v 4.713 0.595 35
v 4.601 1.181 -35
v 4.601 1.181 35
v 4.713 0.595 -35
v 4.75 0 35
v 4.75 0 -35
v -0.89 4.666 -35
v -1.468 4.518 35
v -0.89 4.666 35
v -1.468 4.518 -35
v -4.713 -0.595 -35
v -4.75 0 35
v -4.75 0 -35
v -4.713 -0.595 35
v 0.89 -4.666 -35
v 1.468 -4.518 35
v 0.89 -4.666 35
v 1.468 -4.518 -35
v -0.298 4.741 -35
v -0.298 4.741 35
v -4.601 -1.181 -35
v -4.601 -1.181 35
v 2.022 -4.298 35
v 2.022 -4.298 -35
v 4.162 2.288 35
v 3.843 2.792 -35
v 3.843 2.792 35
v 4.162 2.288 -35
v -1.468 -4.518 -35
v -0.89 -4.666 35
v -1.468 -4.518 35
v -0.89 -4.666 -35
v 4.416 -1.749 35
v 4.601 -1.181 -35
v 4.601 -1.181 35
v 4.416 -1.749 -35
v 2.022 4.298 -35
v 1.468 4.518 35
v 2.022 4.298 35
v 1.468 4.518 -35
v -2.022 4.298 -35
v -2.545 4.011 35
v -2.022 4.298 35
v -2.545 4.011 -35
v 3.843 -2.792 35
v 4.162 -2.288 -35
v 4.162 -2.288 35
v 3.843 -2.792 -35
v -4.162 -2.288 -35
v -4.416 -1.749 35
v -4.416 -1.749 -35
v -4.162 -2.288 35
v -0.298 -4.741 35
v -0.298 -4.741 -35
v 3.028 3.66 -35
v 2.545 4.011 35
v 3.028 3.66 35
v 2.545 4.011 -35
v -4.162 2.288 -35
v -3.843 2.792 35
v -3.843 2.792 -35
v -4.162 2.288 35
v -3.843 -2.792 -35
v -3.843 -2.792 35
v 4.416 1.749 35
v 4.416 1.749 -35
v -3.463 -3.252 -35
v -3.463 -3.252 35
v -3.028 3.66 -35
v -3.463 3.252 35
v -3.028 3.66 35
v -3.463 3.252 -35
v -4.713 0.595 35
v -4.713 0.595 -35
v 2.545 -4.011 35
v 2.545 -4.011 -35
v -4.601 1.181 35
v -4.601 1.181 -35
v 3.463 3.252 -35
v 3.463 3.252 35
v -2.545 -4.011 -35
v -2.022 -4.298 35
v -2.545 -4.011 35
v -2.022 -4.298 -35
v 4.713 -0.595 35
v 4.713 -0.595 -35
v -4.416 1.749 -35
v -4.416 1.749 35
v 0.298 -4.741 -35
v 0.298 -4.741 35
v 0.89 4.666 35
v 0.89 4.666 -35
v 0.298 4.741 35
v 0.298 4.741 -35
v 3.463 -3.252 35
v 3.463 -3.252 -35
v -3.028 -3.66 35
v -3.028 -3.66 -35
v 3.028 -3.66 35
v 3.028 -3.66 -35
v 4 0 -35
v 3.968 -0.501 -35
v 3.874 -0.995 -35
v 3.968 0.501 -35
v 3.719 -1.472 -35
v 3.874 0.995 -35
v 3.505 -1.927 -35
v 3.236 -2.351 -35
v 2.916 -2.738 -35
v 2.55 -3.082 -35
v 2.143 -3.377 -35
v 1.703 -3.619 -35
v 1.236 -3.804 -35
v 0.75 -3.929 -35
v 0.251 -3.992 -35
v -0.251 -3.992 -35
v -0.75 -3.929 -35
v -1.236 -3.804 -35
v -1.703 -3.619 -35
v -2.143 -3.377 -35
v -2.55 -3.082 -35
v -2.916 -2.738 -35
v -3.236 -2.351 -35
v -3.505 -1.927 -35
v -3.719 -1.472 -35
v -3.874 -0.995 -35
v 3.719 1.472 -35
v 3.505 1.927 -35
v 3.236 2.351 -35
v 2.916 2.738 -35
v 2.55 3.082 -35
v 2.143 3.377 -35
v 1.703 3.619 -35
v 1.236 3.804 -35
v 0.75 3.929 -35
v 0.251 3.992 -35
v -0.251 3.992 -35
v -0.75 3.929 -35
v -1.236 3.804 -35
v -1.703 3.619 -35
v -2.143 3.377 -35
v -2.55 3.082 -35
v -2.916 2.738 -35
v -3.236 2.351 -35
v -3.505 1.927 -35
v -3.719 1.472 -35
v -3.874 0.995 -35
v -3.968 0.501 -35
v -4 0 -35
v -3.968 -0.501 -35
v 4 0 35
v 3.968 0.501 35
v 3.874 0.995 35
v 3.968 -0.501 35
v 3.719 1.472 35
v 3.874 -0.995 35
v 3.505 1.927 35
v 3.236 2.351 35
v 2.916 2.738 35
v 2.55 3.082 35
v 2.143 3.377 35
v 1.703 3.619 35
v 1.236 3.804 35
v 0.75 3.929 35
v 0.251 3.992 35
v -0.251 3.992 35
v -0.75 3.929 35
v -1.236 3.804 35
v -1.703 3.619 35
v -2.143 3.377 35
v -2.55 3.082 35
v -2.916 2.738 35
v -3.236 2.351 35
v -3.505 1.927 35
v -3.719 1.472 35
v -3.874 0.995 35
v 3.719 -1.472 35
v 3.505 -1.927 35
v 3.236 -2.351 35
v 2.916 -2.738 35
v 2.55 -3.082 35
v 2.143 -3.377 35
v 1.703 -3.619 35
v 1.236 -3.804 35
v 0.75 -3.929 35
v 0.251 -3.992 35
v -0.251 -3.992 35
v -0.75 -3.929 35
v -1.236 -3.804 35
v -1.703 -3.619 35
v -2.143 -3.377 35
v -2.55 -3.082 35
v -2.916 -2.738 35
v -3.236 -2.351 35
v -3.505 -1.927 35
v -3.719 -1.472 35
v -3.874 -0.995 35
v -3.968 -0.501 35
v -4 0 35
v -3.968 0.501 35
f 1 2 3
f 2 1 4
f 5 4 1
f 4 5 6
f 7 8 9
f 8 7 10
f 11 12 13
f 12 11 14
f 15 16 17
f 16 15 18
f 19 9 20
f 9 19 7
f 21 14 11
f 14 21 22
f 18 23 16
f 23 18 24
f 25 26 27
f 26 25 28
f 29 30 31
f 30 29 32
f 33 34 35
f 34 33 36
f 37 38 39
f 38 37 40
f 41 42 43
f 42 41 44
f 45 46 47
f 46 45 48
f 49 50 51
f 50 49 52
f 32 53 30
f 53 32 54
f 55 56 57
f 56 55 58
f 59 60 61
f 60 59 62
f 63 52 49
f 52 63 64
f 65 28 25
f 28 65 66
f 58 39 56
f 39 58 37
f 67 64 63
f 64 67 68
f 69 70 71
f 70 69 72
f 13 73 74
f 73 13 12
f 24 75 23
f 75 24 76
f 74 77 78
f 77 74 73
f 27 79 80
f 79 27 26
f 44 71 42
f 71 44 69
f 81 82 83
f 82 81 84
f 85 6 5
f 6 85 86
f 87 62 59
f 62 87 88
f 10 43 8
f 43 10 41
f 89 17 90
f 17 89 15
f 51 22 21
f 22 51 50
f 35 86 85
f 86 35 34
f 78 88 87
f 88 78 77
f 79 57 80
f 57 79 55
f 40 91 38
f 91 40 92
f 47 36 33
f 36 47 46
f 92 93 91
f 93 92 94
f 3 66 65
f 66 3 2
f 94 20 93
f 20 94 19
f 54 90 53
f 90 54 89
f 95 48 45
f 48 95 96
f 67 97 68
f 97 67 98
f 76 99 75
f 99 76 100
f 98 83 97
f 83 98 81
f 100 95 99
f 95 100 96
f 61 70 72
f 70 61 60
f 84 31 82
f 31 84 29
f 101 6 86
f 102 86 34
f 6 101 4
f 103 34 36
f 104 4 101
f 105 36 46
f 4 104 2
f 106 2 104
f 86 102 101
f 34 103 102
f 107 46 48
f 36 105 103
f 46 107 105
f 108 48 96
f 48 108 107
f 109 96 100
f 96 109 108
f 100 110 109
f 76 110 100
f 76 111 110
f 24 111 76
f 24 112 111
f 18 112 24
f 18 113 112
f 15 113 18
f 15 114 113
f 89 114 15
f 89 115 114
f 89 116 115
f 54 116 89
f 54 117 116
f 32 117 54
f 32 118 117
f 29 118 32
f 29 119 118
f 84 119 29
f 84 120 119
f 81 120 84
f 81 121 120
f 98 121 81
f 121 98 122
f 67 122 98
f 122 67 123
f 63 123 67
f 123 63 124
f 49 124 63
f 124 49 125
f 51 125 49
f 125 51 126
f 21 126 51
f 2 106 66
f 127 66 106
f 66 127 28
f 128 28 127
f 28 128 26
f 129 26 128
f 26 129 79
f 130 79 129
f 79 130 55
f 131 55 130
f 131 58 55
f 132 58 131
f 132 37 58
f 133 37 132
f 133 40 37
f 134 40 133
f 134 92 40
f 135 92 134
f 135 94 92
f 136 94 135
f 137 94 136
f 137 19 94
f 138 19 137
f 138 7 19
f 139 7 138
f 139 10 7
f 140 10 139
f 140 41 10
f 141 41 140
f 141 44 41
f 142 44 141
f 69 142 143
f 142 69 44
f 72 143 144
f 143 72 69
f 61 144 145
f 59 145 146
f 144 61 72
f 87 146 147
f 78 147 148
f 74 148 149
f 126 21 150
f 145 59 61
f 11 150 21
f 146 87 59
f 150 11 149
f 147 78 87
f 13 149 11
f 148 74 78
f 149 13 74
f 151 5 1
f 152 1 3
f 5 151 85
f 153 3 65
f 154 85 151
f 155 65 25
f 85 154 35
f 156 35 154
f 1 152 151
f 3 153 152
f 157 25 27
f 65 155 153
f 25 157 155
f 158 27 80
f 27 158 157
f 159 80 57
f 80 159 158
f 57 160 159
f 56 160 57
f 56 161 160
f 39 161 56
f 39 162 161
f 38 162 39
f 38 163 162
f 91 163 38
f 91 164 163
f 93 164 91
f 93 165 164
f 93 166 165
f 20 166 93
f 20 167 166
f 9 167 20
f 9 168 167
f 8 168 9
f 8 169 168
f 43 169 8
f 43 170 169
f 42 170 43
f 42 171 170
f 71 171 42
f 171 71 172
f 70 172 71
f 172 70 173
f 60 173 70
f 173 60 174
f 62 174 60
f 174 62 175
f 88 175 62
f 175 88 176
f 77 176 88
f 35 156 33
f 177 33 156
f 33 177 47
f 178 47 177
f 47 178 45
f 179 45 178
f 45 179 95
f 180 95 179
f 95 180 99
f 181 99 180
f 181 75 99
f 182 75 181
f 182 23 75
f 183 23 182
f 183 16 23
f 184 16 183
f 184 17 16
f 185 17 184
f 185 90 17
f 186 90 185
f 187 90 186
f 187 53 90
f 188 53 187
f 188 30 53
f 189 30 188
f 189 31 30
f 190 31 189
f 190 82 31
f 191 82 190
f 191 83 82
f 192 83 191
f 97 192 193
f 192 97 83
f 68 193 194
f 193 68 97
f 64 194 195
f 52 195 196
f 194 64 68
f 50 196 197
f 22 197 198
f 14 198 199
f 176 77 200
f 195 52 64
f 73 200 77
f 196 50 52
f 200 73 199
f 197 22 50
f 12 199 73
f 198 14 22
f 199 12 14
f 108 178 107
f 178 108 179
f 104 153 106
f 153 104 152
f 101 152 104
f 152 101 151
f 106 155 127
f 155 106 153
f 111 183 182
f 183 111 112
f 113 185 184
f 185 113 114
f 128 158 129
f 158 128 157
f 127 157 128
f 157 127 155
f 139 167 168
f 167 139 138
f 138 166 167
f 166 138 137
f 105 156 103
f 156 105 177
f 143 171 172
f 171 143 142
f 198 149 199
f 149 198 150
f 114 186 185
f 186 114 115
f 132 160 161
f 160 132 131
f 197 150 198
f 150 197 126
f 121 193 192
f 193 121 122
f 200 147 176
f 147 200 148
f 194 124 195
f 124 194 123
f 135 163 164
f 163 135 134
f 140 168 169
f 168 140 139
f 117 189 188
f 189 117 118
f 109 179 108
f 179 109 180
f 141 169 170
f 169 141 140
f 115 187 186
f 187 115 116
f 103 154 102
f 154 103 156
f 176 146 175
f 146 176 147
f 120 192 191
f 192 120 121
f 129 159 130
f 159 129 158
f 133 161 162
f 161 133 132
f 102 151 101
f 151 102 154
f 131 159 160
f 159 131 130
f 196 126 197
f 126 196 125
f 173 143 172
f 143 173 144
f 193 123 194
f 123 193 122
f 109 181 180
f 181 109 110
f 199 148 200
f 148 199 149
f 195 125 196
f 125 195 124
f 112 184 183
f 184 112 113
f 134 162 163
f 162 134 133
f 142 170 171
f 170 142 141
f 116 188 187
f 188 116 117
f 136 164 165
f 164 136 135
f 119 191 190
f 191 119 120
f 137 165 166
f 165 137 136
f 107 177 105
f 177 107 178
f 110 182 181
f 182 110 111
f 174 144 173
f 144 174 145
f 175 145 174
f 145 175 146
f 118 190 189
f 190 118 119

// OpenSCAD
$fn = 50;


difference() {
	union() {
		translate(v = [0, 0, -35.0000000000]) {
			cylinder(h = 70, r = 4.7500000000);
		}
	}
	union() {
		translate(v = [0, 0, -100.0000000000]) {
			cylinder(h = 200, r = 4.0000000000);
		}
	}
}
